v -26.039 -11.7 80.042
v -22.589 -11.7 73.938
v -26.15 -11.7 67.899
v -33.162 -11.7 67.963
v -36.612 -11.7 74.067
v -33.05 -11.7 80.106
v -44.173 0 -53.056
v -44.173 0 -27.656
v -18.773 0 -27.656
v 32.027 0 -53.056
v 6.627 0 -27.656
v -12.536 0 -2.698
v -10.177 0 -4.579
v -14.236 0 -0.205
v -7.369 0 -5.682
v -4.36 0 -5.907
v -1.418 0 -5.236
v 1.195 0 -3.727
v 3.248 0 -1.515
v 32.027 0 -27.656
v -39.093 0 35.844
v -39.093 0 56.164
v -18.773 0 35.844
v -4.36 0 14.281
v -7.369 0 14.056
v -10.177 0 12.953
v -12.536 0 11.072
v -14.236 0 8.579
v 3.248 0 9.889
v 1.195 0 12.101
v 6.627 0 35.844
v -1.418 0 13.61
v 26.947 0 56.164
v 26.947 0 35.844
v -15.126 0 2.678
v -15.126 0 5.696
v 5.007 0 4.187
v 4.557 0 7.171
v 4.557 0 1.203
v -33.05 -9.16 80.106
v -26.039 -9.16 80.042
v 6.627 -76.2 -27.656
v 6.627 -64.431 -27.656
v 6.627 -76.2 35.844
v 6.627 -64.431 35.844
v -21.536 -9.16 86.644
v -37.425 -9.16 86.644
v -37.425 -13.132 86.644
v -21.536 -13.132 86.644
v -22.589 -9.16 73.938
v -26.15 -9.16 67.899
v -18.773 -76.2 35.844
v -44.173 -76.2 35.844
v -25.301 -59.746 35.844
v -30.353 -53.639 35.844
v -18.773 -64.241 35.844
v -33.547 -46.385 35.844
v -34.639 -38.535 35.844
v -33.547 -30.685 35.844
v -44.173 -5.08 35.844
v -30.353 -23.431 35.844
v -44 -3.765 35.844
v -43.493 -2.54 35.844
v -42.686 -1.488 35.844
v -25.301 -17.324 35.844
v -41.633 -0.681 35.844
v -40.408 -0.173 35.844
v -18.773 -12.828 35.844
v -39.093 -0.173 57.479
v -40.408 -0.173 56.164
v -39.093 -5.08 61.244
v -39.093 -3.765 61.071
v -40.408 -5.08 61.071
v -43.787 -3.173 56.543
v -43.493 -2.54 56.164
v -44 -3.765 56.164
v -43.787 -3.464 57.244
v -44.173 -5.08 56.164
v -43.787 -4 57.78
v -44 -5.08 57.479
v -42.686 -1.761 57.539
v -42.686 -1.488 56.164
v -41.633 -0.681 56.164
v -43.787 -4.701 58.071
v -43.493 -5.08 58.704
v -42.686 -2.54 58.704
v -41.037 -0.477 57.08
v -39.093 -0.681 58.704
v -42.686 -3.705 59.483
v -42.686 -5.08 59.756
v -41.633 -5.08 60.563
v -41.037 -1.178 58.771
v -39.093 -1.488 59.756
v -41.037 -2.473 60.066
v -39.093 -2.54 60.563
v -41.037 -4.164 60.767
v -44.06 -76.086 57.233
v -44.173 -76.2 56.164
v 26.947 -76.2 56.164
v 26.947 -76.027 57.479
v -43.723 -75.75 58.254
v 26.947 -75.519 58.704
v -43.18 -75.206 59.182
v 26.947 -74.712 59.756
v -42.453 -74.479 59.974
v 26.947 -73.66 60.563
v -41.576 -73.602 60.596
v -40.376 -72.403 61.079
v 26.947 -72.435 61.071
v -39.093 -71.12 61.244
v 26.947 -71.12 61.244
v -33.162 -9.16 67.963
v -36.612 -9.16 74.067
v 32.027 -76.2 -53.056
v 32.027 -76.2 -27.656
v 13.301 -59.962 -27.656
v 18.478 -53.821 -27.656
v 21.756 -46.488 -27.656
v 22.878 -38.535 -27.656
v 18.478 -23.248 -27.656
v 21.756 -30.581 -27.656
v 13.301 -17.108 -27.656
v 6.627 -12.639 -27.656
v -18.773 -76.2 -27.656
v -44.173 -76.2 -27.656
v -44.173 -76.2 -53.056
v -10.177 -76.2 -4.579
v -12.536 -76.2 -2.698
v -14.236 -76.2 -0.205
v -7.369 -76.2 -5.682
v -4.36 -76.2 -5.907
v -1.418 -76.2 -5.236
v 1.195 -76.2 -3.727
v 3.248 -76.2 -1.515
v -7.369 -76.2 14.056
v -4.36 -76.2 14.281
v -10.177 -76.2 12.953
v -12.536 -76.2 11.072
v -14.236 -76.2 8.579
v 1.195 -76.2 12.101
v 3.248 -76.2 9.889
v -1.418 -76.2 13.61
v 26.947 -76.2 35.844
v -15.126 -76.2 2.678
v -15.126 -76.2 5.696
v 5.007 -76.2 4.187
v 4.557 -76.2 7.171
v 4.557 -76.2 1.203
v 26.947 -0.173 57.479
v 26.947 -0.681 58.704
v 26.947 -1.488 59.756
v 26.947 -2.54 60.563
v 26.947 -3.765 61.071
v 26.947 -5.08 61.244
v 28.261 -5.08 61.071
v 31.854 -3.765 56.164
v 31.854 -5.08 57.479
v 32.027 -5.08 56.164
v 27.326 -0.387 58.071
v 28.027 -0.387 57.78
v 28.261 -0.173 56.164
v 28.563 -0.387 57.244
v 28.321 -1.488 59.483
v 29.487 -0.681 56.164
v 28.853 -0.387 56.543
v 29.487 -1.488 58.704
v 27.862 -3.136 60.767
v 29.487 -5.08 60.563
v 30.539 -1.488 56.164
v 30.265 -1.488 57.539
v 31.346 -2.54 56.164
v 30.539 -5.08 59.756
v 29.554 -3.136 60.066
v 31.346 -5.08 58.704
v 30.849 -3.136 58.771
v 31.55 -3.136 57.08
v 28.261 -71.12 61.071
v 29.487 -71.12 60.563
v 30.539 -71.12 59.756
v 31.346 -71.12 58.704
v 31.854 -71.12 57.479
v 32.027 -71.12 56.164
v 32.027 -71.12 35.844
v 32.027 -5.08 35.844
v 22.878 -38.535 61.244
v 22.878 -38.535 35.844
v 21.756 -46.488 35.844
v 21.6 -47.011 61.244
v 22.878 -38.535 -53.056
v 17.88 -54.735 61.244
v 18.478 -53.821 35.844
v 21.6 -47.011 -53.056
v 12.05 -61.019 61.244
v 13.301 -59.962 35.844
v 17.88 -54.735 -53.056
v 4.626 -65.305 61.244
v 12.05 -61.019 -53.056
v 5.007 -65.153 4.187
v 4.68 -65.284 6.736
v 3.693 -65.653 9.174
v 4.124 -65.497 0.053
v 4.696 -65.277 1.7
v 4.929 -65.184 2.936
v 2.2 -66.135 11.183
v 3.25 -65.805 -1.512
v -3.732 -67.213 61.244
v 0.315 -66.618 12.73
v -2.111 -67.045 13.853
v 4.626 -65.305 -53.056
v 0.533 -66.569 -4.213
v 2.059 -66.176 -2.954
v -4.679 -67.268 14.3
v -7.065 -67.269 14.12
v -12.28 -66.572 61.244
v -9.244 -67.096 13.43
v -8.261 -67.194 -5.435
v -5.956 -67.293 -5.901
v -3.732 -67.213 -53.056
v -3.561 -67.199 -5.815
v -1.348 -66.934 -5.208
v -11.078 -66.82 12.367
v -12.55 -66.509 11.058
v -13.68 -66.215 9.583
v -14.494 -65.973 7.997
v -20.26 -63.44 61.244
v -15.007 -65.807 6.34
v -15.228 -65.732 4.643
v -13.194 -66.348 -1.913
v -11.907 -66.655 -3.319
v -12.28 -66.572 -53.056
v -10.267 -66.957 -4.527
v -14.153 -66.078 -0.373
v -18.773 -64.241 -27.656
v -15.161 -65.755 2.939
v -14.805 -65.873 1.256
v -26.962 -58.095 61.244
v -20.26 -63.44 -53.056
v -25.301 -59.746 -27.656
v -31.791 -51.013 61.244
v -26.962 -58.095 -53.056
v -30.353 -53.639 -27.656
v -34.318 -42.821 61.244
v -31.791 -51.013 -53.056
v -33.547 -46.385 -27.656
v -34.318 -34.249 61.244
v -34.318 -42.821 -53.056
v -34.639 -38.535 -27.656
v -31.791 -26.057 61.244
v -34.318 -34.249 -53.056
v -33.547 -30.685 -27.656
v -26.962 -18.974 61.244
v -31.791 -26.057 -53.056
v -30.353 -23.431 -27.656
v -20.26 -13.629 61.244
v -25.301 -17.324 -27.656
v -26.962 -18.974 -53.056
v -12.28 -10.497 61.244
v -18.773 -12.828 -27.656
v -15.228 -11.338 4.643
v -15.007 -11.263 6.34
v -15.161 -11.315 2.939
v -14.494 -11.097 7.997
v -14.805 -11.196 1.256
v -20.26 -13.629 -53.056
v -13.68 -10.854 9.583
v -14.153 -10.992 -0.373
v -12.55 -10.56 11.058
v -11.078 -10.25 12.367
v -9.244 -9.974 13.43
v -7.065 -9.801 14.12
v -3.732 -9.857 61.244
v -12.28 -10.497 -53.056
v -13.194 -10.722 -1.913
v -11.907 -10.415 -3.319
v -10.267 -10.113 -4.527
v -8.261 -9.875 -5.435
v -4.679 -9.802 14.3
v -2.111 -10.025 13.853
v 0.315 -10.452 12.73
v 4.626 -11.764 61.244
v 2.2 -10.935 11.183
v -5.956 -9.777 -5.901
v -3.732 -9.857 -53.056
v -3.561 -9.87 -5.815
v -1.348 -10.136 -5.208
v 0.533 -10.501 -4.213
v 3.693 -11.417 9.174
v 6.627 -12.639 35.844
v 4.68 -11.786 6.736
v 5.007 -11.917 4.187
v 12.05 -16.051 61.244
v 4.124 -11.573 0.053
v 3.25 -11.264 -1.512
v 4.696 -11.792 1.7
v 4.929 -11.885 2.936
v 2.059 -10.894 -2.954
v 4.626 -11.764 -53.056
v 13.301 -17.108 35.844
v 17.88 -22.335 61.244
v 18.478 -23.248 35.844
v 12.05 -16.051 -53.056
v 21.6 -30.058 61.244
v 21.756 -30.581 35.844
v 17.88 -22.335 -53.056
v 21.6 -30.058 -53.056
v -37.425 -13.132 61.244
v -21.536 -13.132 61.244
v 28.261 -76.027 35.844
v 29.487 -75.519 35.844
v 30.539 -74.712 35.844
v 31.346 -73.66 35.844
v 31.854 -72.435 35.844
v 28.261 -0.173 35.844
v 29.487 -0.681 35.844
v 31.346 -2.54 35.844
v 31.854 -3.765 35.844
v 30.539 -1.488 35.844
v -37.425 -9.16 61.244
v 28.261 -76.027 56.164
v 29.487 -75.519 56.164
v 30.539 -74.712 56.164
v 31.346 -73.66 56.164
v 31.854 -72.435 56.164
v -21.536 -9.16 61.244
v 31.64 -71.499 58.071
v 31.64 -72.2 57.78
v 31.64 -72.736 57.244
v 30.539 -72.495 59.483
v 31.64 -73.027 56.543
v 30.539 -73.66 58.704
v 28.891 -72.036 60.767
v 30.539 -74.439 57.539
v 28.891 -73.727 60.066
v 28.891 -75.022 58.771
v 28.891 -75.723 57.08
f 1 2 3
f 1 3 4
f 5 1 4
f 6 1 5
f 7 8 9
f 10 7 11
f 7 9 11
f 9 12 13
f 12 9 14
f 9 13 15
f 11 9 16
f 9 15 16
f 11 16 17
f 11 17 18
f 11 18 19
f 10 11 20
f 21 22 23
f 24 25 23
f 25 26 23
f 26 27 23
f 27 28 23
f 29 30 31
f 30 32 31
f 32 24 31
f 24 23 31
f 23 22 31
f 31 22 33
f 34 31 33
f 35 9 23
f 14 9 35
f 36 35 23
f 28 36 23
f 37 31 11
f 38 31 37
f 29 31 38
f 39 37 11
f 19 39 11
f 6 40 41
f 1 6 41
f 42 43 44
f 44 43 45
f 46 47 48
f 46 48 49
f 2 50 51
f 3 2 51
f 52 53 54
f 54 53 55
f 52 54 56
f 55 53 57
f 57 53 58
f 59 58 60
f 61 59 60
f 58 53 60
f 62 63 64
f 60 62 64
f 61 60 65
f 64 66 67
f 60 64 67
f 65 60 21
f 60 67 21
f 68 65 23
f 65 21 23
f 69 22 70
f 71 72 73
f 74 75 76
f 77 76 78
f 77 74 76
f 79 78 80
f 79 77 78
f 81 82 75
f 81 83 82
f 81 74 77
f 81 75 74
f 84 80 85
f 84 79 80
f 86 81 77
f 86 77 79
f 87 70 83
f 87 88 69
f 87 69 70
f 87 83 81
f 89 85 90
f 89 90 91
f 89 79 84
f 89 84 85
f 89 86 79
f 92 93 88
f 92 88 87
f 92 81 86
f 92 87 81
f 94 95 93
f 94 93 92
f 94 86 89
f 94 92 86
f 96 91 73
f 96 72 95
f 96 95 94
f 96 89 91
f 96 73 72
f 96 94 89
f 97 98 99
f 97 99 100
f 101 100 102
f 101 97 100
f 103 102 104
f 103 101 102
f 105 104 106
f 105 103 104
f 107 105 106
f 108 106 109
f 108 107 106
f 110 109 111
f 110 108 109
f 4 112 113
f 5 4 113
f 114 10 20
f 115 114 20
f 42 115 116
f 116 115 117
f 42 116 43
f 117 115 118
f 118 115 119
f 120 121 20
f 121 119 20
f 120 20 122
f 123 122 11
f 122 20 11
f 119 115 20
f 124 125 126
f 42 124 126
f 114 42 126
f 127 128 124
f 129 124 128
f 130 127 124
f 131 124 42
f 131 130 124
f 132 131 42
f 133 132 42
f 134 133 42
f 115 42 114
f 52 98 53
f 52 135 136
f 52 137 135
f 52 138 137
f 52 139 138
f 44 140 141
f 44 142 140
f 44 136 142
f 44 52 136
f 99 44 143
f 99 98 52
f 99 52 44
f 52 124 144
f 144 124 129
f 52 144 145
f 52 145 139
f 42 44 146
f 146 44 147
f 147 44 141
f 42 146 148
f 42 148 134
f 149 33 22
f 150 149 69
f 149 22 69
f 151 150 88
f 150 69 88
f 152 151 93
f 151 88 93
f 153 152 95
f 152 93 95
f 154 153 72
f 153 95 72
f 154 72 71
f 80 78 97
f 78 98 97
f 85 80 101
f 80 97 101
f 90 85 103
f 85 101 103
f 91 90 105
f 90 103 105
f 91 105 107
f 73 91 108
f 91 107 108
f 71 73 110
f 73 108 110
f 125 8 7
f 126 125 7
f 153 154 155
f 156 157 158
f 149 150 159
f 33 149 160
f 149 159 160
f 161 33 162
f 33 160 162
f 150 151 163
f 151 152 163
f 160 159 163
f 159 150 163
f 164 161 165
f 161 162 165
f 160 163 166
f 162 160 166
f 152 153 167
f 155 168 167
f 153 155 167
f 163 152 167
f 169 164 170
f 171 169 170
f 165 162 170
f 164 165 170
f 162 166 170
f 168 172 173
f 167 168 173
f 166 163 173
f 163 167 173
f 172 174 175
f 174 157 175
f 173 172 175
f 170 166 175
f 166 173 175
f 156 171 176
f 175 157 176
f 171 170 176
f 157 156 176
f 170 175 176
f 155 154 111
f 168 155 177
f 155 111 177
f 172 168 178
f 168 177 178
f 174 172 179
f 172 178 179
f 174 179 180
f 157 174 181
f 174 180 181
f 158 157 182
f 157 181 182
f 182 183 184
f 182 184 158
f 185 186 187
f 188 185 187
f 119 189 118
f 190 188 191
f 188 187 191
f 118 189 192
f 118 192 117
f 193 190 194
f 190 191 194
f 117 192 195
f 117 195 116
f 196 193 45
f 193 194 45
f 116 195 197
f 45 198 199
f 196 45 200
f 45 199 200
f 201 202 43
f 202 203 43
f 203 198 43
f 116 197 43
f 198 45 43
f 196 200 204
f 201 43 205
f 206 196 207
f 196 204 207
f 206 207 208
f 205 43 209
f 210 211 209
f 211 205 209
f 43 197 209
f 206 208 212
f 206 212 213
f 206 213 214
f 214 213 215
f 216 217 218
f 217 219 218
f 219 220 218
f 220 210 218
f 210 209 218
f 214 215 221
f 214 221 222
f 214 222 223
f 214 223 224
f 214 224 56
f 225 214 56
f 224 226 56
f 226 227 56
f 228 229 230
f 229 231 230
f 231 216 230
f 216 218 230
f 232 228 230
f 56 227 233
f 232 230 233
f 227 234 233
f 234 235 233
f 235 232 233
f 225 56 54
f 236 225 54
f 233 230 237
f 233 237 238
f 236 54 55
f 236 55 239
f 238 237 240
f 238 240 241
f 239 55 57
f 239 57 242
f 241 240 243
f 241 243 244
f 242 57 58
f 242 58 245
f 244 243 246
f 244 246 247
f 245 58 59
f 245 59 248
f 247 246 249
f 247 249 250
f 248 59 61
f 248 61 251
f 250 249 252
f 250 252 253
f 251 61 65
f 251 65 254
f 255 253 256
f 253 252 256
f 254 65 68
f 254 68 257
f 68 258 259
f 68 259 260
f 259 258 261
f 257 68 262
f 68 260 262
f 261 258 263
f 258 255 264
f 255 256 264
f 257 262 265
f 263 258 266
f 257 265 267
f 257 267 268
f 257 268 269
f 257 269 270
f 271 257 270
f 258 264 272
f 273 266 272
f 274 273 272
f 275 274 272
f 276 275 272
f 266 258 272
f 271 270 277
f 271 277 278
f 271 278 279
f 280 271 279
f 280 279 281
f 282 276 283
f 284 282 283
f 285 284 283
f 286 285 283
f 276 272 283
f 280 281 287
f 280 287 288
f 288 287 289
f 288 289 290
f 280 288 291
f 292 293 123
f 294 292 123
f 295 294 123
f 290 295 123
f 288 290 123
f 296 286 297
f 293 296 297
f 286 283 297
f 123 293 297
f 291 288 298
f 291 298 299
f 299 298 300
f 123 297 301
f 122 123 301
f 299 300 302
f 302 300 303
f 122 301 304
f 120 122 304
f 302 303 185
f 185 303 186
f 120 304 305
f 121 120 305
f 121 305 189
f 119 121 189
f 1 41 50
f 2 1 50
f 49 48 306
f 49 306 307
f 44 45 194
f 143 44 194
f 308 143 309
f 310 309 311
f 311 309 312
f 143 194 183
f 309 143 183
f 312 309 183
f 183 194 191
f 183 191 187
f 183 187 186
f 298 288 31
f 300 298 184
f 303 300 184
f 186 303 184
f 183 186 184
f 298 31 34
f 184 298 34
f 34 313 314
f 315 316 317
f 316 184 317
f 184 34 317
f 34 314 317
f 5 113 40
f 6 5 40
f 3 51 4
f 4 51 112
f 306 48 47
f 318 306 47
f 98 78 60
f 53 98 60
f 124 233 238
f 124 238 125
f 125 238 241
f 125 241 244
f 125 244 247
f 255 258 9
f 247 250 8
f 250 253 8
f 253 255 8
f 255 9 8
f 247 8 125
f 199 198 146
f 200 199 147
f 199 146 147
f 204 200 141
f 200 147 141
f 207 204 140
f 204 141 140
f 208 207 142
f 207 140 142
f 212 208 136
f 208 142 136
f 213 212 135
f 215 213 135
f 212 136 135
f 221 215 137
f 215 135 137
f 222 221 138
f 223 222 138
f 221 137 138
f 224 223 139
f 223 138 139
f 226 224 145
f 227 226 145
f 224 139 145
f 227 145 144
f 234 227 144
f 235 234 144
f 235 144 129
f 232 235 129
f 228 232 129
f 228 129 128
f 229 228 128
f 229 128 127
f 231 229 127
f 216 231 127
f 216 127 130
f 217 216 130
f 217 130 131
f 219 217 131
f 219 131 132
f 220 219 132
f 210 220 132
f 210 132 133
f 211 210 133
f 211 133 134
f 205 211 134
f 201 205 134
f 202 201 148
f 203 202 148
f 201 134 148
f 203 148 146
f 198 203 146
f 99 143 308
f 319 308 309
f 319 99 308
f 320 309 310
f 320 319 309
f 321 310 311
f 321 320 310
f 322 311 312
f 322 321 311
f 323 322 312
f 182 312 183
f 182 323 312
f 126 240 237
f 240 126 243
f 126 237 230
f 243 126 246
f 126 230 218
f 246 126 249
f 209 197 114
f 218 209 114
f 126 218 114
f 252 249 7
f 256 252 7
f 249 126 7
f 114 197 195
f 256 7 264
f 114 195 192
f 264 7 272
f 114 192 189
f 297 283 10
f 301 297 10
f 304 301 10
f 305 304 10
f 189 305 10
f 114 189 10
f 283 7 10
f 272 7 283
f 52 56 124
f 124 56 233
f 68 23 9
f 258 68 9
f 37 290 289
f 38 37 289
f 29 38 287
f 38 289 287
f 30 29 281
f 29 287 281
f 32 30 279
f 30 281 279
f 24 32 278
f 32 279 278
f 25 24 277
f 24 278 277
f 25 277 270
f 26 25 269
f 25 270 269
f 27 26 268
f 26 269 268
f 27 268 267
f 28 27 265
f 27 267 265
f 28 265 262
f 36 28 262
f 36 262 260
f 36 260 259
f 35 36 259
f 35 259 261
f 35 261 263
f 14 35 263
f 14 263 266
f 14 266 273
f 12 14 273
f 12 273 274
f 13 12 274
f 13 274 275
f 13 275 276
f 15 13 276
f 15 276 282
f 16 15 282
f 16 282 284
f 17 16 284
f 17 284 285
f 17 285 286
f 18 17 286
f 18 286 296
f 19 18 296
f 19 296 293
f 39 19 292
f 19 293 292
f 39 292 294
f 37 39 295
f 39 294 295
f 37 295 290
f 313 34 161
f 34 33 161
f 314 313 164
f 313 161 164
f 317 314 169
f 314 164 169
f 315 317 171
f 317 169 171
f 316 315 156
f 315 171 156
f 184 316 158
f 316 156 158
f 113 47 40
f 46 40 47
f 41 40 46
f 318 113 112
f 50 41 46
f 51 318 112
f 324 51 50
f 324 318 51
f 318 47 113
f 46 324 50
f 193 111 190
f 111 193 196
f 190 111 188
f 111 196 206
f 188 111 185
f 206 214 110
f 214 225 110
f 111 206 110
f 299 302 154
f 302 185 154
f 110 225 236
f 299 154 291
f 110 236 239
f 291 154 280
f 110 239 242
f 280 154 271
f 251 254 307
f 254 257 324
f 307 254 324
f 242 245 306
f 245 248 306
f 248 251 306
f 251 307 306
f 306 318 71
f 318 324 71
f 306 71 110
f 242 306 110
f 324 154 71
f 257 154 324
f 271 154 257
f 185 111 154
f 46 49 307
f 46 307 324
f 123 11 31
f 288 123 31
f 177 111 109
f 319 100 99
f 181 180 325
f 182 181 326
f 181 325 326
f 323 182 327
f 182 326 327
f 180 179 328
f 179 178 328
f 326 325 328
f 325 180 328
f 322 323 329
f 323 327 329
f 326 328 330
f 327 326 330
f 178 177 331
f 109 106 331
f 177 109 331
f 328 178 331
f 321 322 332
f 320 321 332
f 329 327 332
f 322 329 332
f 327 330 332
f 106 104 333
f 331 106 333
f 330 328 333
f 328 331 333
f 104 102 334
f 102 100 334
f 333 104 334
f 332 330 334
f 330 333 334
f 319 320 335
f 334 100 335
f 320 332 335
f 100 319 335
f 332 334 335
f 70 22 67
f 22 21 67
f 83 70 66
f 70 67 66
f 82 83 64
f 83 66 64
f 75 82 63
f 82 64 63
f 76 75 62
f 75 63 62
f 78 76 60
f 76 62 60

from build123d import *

# Parameters (mm, degrees)
F1_DEPTH  = 76.2
F2_R      = 16.759679
F3_DEPTH  = 50.801
F4_R      = 10.122636
F5_DEPTH  = 76.201
F6_R      = 28.758391
F7_DEPTH  = 114.301
F8_R      = 5.08
F10_W     = 15.888512
F10_H     = 3.972126
F11_DEPTH = 25.4
F13_DEPTH = 2.54


with BuildPart() as f1:
    # F0 (on Front) → F1 (new body)
    with BuildSketch(Plane.XZ):
        Polygon((-44.173401, -27.656091), (-44.173401, -53.056091), (32.026599, -53.056091), (32.026599, -27.656091), (6.626599, -27.656091), (6.626599, 35.843909), (32.026599, 35.843909), (32.026599, 61.243909), (-44.173401, 61.243909), (-44.173401, 35.843909), (-18.773401, 35.843909), (-18.773401, -27.656091), align=None)
    extrude(amount=F1_DEPTH)

    # F2 (on face) → F3 (cut, through all)
    with BuildSketch(Plane.YZ.offset(6.626599)):
        with Locations((-43.022785, 3.559439)):
            Circle(F2_R)
    extrude(amount=-F3_DEPTH, mode=Mode.SUBTRACT)

    # F4 (on face) → F5 (cut, through all)
    with BuildSketch(Plane.XZ.offset(76.2)):
        with Locations((-5.116025, 4.186992)):
            Circle(F4_R)
    extrude(amount=-F5_DEPTH, mode=Mode.SUBTRACT)

    # F6 (on face) → F7 (cut, through all)
    with BuildSketch(Plane(origin=(0, 0, -53.056091), x_dir=(1, 0, 0), z_dir=(0, 0, -1))):
        with Locations((-5.880812, 38.534798)):
            Circle(F6_R)
    extrude(amount=-F7_DEPTH, mode=Mode.SUBTRACT)

    # F8
    f8_edges = [f1.edges().sort_by_distance(p)[0] for p in [
        (-6.073401, -76.2, 61.243909),
        (32.026599, -38.1, 61.243909),
        (32.026599, -76.2, 48.543909),
        (-6.073401, 0, 61.243909),
        (32.026599, 0, 48.543909),
        (-44.173401, 0, 48.543909),
        (-44.173401, -38.1, 61.243909),
    ]]
    fillet(f8_edges, radius=F8_R)

    # F10 (on face) → F11 (join)
    with BuildSketch(Plane.XY.offset(61.243909)):
        with Locations((-29.480584, -11.146277)):
            Rectangle(F10_W, F10_H)
    extrude(amount=F11_DEPTH)

    # F12 (on face) → F13 (cut)
    with BuildSketch(Plane(origin=(0, -9.160214, 0), x_dir=(-1, 0, 0), z_dir=(0, 1, 0))):
        Polygon((33.161537, 67.962763), (36.611519, 74.066582), (33.050448, 80.106264), (26.039395, 80.042126), (22.589412, 73.938308), (26.150483, 67.898626), align=None)
    extrude(amount=-F13_DEPTH, mode=Mode.SUBTRACT)


solid = f1.part
